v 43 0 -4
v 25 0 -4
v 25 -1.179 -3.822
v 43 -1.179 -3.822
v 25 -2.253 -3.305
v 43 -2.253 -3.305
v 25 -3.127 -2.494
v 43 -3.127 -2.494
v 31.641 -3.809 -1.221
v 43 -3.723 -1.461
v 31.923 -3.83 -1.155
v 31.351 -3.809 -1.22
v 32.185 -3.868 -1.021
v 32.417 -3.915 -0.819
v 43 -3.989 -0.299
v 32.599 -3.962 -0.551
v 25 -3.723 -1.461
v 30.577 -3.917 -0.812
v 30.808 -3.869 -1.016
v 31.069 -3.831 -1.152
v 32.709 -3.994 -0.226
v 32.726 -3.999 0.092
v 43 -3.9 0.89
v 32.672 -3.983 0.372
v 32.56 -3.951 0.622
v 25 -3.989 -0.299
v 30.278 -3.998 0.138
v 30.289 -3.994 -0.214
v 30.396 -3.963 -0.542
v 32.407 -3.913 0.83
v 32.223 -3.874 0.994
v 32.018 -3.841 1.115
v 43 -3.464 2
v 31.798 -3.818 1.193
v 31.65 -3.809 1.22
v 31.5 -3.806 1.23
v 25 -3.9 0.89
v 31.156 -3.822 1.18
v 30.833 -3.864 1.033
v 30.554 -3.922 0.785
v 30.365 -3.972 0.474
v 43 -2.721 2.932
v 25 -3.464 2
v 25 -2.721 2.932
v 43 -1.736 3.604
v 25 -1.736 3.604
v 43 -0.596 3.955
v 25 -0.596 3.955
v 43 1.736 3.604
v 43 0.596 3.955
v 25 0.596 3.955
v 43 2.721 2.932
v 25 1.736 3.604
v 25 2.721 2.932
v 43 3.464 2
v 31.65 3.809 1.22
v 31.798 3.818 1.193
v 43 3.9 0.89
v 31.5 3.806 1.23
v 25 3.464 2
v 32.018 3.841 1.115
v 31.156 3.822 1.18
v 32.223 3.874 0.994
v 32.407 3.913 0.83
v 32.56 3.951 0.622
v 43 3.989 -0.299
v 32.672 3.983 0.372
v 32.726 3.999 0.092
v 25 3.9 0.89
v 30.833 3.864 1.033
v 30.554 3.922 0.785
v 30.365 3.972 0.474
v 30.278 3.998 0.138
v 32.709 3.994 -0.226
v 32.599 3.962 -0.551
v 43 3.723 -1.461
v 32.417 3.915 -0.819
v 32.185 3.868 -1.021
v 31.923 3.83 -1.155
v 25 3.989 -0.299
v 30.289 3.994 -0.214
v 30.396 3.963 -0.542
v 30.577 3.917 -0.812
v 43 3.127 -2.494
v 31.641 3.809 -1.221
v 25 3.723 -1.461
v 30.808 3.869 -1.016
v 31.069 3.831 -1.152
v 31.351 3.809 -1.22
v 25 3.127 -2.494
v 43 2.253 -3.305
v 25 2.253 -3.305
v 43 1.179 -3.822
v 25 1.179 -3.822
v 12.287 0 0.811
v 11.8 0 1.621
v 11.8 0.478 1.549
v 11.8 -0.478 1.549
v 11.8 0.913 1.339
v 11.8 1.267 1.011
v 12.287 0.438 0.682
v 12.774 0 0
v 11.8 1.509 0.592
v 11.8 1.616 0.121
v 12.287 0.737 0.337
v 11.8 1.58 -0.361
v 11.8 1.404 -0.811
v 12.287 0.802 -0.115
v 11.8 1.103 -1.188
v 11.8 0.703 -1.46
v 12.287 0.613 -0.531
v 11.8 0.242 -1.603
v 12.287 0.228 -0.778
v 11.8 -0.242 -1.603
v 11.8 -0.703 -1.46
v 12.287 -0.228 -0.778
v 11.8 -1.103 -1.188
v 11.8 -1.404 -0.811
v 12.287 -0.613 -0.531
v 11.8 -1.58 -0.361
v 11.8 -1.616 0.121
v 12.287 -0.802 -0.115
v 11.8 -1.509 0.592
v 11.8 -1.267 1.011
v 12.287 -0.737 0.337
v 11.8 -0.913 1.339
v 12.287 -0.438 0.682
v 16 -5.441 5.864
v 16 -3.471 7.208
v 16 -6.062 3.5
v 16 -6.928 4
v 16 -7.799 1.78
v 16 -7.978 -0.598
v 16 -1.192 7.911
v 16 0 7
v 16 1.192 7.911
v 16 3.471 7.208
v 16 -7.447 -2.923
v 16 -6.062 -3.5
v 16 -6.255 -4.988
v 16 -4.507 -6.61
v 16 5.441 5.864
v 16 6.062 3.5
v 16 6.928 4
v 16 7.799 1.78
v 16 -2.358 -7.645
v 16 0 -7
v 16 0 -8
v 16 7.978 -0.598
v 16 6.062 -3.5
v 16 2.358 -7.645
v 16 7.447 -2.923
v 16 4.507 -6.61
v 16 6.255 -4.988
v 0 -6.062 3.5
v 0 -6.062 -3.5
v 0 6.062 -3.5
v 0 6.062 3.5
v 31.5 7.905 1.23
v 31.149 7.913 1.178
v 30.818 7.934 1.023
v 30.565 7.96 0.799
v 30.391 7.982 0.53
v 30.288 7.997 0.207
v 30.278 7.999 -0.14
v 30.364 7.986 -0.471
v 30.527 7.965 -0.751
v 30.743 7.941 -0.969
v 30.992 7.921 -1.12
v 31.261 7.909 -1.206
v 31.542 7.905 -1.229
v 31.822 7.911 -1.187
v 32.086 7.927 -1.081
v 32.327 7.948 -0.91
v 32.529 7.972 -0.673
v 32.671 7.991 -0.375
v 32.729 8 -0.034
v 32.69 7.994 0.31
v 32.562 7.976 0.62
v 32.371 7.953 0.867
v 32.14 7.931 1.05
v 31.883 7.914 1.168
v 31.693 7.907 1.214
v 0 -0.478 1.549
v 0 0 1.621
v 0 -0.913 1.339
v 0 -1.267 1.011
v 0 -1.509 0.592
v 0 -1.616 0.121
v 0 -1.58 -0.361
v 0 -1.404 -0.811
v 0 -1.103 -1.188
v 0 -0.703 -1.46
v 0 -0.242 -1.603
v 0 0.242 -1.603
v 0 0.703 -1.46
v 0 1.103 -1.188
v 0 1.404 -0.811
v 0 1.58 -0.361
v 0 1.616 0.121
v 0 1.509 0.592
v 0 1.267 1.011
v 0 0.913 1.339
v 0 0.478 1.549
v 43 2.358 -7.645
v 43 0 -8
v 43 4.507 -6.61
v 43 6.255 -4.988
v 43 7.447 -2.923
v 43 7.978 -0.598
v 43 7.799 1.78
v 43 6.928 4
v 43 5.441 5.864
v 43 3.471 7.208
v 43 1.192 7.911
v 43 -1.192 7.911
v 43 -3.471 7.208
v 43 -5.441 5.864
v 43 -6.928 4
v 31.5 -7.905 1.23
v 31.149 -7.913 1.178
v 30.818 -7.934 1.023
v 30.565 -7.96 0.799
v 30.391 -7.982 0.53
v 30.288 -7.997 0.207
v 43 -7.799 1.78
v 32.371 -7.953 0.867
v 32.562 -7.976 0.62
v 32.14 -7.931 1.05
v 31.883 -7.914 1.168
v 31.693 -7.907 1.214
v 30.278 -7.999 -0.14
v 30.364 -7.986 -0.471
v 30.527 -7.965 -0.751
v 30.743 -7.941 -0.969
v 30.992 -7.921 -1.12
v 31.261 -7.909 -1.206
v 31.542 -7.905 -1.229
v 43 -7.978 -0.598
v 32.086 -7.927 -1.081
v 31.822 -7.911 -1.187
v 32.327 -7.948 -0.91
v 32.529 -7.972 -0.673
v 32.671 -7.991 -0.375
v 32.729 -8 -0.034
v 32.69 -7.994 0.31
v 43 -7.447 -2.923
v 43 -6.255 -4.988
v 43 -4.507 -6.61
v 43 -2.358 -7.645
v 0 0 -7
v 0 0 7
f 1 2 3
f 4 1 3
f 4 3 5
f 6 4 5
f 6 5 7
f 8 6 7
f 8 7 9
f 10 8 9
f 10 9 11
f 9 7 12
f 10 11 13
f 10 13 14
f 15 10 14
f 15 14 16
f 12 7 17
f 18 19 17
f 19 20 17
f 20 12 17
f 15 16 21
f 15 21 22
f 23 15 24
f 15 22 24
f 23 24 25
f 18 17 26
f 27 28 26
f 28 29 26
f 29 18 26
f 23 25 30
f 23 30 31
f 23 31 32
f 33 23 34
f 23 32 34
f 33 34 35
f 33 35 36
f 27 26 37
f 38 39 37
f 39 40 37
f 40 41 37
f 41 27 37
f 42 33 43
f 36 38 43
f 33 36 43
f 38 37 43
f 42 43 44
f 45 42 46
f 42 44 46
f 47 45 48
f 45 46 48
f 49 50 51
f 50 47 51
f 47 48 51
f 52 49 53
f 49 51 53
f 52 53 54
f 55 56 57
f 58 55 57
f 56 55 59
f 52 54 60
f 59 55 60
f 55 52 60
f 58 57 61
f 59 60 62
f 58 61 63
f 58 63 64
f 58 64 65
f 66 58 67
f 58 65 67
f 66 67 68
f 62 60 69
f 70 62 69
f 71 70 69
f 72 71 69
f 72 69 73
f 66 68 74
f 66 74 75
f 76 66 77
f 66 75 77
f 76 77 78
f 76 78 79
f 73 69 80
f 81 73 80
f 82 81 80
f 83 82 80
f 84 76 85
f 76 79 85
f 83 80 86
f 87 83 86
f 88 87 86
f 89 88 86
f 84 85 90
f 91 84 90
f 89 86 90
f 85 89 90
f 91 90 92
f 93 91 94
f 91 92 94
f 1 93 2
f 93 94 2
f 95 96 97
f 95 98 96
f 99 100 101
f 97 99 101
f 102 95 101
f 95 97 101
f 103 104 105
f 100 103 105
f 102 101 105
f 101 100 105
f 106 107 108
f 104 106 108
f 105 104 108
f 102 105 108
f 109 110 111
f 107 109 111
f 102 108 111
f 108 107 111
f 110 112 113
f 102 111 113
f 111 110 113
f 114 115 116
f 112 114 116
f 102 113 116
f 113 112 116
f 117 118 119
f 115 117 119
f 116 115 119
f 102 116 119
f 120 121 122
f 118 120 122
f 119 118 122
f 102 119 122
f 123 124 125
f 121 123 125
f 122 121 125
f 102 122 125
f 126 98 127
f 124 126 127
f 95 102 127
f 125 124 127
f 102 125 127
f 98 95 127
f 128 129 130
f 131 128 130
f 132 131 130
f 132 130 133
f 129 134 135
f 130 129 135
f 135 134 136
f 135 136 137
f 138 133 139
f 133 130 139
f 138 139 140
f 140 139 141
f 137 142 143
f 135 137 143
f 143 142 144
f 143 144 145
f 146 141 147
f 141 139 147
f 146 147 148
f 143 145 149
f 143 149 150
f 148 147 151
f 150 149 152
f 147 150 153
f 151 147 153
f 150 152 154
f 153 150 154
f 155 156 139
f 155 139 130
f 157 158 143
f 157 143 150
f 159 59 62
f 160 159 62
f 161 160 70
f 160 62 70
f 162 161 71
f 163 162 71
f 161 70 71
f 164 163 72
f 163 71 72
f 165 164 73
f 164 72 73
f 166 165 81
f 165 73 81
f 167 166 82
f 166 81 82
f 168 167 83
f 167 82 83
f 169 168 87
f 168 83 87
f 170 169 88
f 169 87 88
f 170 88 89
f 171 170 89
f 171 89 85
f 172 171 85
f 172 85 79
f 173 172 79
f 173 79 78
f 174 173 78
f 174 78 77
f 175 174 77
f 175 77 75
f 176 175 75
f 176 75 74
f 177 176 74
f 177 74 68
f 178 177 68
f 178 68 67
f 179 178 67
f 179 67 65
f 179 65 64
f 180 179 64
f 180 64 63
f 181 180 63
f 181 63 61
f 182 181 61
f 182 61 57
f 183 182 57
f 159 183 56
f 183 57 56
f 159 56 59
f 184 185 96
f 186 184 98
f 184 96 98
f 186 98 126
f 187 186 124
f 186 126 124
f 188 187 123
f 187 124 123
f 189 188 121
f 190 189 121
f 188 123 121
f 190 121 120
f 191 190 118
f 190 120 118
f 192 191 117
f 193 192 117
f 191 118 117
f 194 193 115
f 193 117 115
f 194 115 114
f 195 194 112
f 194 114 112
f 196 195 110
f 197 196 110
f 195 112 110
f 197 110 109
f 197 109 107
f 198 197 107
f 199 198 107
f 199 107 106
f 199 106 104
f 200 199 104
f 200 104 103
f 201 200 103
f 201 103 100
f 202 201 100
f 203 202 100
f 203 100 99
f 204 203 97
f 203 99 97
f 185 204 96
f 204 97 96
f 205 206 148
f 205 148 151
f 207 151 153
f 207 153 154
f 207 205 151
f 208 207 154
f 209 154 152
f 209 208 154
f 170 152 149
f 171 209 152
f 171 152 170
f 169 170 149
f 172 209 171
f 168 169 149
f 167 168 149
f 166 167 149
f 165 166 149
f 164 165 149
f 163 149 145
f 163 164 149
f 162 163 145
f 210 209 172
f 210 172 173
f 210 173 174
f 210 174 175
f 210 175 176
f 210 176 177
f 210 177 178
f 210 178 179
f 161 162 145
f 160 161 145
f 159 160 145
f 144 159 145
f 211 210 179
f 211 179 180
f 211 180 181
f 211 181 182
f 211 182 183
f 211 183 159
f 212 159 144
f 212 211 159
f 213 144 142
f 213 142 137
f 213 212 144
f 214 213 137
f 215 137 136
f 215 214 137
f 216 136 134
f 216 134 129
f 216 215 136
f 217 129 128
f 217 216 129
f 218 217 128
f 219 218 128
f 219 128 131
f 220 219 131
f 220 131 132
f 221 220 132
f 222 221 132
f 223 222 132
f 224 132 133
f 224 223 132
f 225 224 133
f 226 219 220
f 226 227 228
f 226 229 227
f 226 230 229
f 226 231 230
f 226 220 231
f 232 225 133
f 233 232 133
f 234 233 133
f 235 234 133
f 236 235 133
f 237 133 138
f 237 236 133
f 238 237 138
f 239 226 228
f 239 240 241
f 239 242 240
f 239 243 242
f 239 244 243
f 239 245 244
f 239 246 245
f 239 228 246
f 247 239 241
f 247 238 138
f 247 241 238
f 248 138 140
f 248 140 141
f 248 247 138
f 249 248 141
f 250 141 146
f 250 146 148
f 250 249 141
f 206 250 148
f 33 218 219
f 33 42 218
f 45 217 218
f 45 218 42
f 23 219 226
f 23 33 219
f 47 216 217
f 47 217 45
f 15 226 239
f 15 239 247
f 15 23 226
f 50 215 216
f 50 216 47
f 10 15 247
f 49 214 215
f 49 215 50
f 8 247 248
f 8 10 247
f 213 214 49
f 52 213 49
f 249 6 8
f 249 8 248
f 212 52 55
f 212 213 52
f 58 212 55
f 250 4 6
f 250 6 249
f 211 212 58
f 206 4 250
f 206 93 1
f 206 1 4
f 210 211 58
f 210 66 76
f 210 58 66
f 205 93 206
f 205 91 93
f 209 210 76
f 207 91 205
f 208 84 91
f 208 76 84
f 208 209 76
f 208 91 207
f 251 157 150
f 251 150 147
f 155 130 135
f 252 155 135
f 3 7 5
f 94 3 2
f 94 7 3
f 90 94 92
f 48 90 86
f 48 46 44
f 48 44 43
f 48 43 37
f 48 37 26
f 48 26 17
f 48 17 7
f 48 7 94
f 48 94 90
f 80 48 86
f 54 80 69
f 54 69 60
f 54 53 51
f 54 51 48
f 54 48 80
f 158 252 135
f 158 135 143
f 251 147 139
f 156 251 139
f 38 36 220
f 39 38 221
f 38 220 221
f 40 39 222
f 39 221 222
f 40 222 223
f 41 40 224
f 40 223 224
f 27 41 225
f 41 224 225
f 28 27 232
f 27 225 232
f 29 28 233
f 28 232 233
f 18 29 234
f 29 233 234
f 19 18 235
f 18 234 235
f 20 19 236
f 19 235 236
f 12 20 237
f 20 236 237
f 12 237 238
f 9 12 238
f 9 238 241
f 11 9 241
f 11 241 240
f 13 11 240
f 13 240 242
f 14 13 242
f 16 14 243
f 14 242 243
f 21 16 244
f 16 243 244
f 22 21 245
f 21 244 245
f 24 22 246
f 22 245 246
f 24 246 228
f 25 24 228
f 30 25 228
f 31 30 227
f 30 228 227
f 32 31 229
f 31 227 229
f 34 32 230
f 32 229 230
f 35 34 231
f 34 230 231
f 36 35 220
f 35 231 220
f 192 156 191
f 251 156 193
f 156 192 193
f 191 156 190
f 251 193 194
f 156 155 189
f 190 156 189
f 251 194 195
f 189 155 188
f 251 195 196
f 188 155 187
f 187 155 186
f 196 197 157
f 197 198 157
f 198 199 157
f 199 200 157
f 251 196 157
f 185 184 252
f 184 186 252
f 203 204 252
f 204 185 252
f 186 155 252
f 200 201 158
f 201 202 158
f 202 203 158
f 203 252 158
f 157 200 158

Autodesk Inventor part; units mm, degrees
ref_plane "YZ Plane" through (0, 0, 0) normal (1, 0, 0) x (0, 1, 0)
ref_plane "XY Plane" through (0, 0, 0) normal (0, 0, 1) x (1, 0, 0)
sketch "Эскиз1" plane through (0, 0, 0) normal (1, 0, 0) x (0, 1, 0)
  line L0 (6.0622, 3.5) -> (6.0622, -3.5)
  line L1 (6.0622, -3.5) -> (0, -7)
  line L2 (0, -7) -> (-6.0622, -3.5)
  line L3 (-6.0622, -3.5) -> (-6.0622, 3.5)
  line L4 (-6.0622, 3.5) -> (0, 7)
  line L5 (0, 7) -> (6.0622, 3.5)
  circle A0 centre (0, 0) radius 7 construction
  dimension "d0" = 14
extrude "Выдавливание1" add sketch "Эскиз1" along normal blind 25
sketch "Эскиз2" plane through (25, 0, 0) normal (1, 0, 0) x (0, 0, -1)
  circle A0 centre (0, 0) radius 8
  circle A1 centre (0, 0) radius 4
  dimension "d3" = 16
  dimension "d6" = 8
extrude "Выдавливание2" add sketch "Эскиз2" along normal blind 18 and the other way blind 9
ref_plane "РабПлоскость1" through (0, 9, 0) normal (0, 1, 0) x (-1, 0, 0)
sketch "Эскиз3" plane through (0, 9, 0) normal (0, 1, 0) x (-1, 0, 0)
  line L0 (-43, 8) -> (-43, -8) projected
  point P0 (0, 0)
  point P1 (-31.5, 0)
  dimension "d16" = 11.5
hole "Отверстие1" at (31.5, 9, 0) direction (0, -1, 0) diameter 2.459 end through all thread size "M3x0.5" class "6H" standard "ISO Metric profile"
sketch "Эскиз4" plane through (0, 0, 0) normal (-1, 0, 0) x (0, 0, 1)
  point P0 (0, 0)
  point P1 (0, 0)
hole "Отверстие2" at (0, 0, 0) direction (1, 0, 0) diameter 3.242 depth 11.8 tip angle 118 thread size "M4x0.7" class "6H" standard "ISO Metric profile"
properties part number "переходная втулка"
